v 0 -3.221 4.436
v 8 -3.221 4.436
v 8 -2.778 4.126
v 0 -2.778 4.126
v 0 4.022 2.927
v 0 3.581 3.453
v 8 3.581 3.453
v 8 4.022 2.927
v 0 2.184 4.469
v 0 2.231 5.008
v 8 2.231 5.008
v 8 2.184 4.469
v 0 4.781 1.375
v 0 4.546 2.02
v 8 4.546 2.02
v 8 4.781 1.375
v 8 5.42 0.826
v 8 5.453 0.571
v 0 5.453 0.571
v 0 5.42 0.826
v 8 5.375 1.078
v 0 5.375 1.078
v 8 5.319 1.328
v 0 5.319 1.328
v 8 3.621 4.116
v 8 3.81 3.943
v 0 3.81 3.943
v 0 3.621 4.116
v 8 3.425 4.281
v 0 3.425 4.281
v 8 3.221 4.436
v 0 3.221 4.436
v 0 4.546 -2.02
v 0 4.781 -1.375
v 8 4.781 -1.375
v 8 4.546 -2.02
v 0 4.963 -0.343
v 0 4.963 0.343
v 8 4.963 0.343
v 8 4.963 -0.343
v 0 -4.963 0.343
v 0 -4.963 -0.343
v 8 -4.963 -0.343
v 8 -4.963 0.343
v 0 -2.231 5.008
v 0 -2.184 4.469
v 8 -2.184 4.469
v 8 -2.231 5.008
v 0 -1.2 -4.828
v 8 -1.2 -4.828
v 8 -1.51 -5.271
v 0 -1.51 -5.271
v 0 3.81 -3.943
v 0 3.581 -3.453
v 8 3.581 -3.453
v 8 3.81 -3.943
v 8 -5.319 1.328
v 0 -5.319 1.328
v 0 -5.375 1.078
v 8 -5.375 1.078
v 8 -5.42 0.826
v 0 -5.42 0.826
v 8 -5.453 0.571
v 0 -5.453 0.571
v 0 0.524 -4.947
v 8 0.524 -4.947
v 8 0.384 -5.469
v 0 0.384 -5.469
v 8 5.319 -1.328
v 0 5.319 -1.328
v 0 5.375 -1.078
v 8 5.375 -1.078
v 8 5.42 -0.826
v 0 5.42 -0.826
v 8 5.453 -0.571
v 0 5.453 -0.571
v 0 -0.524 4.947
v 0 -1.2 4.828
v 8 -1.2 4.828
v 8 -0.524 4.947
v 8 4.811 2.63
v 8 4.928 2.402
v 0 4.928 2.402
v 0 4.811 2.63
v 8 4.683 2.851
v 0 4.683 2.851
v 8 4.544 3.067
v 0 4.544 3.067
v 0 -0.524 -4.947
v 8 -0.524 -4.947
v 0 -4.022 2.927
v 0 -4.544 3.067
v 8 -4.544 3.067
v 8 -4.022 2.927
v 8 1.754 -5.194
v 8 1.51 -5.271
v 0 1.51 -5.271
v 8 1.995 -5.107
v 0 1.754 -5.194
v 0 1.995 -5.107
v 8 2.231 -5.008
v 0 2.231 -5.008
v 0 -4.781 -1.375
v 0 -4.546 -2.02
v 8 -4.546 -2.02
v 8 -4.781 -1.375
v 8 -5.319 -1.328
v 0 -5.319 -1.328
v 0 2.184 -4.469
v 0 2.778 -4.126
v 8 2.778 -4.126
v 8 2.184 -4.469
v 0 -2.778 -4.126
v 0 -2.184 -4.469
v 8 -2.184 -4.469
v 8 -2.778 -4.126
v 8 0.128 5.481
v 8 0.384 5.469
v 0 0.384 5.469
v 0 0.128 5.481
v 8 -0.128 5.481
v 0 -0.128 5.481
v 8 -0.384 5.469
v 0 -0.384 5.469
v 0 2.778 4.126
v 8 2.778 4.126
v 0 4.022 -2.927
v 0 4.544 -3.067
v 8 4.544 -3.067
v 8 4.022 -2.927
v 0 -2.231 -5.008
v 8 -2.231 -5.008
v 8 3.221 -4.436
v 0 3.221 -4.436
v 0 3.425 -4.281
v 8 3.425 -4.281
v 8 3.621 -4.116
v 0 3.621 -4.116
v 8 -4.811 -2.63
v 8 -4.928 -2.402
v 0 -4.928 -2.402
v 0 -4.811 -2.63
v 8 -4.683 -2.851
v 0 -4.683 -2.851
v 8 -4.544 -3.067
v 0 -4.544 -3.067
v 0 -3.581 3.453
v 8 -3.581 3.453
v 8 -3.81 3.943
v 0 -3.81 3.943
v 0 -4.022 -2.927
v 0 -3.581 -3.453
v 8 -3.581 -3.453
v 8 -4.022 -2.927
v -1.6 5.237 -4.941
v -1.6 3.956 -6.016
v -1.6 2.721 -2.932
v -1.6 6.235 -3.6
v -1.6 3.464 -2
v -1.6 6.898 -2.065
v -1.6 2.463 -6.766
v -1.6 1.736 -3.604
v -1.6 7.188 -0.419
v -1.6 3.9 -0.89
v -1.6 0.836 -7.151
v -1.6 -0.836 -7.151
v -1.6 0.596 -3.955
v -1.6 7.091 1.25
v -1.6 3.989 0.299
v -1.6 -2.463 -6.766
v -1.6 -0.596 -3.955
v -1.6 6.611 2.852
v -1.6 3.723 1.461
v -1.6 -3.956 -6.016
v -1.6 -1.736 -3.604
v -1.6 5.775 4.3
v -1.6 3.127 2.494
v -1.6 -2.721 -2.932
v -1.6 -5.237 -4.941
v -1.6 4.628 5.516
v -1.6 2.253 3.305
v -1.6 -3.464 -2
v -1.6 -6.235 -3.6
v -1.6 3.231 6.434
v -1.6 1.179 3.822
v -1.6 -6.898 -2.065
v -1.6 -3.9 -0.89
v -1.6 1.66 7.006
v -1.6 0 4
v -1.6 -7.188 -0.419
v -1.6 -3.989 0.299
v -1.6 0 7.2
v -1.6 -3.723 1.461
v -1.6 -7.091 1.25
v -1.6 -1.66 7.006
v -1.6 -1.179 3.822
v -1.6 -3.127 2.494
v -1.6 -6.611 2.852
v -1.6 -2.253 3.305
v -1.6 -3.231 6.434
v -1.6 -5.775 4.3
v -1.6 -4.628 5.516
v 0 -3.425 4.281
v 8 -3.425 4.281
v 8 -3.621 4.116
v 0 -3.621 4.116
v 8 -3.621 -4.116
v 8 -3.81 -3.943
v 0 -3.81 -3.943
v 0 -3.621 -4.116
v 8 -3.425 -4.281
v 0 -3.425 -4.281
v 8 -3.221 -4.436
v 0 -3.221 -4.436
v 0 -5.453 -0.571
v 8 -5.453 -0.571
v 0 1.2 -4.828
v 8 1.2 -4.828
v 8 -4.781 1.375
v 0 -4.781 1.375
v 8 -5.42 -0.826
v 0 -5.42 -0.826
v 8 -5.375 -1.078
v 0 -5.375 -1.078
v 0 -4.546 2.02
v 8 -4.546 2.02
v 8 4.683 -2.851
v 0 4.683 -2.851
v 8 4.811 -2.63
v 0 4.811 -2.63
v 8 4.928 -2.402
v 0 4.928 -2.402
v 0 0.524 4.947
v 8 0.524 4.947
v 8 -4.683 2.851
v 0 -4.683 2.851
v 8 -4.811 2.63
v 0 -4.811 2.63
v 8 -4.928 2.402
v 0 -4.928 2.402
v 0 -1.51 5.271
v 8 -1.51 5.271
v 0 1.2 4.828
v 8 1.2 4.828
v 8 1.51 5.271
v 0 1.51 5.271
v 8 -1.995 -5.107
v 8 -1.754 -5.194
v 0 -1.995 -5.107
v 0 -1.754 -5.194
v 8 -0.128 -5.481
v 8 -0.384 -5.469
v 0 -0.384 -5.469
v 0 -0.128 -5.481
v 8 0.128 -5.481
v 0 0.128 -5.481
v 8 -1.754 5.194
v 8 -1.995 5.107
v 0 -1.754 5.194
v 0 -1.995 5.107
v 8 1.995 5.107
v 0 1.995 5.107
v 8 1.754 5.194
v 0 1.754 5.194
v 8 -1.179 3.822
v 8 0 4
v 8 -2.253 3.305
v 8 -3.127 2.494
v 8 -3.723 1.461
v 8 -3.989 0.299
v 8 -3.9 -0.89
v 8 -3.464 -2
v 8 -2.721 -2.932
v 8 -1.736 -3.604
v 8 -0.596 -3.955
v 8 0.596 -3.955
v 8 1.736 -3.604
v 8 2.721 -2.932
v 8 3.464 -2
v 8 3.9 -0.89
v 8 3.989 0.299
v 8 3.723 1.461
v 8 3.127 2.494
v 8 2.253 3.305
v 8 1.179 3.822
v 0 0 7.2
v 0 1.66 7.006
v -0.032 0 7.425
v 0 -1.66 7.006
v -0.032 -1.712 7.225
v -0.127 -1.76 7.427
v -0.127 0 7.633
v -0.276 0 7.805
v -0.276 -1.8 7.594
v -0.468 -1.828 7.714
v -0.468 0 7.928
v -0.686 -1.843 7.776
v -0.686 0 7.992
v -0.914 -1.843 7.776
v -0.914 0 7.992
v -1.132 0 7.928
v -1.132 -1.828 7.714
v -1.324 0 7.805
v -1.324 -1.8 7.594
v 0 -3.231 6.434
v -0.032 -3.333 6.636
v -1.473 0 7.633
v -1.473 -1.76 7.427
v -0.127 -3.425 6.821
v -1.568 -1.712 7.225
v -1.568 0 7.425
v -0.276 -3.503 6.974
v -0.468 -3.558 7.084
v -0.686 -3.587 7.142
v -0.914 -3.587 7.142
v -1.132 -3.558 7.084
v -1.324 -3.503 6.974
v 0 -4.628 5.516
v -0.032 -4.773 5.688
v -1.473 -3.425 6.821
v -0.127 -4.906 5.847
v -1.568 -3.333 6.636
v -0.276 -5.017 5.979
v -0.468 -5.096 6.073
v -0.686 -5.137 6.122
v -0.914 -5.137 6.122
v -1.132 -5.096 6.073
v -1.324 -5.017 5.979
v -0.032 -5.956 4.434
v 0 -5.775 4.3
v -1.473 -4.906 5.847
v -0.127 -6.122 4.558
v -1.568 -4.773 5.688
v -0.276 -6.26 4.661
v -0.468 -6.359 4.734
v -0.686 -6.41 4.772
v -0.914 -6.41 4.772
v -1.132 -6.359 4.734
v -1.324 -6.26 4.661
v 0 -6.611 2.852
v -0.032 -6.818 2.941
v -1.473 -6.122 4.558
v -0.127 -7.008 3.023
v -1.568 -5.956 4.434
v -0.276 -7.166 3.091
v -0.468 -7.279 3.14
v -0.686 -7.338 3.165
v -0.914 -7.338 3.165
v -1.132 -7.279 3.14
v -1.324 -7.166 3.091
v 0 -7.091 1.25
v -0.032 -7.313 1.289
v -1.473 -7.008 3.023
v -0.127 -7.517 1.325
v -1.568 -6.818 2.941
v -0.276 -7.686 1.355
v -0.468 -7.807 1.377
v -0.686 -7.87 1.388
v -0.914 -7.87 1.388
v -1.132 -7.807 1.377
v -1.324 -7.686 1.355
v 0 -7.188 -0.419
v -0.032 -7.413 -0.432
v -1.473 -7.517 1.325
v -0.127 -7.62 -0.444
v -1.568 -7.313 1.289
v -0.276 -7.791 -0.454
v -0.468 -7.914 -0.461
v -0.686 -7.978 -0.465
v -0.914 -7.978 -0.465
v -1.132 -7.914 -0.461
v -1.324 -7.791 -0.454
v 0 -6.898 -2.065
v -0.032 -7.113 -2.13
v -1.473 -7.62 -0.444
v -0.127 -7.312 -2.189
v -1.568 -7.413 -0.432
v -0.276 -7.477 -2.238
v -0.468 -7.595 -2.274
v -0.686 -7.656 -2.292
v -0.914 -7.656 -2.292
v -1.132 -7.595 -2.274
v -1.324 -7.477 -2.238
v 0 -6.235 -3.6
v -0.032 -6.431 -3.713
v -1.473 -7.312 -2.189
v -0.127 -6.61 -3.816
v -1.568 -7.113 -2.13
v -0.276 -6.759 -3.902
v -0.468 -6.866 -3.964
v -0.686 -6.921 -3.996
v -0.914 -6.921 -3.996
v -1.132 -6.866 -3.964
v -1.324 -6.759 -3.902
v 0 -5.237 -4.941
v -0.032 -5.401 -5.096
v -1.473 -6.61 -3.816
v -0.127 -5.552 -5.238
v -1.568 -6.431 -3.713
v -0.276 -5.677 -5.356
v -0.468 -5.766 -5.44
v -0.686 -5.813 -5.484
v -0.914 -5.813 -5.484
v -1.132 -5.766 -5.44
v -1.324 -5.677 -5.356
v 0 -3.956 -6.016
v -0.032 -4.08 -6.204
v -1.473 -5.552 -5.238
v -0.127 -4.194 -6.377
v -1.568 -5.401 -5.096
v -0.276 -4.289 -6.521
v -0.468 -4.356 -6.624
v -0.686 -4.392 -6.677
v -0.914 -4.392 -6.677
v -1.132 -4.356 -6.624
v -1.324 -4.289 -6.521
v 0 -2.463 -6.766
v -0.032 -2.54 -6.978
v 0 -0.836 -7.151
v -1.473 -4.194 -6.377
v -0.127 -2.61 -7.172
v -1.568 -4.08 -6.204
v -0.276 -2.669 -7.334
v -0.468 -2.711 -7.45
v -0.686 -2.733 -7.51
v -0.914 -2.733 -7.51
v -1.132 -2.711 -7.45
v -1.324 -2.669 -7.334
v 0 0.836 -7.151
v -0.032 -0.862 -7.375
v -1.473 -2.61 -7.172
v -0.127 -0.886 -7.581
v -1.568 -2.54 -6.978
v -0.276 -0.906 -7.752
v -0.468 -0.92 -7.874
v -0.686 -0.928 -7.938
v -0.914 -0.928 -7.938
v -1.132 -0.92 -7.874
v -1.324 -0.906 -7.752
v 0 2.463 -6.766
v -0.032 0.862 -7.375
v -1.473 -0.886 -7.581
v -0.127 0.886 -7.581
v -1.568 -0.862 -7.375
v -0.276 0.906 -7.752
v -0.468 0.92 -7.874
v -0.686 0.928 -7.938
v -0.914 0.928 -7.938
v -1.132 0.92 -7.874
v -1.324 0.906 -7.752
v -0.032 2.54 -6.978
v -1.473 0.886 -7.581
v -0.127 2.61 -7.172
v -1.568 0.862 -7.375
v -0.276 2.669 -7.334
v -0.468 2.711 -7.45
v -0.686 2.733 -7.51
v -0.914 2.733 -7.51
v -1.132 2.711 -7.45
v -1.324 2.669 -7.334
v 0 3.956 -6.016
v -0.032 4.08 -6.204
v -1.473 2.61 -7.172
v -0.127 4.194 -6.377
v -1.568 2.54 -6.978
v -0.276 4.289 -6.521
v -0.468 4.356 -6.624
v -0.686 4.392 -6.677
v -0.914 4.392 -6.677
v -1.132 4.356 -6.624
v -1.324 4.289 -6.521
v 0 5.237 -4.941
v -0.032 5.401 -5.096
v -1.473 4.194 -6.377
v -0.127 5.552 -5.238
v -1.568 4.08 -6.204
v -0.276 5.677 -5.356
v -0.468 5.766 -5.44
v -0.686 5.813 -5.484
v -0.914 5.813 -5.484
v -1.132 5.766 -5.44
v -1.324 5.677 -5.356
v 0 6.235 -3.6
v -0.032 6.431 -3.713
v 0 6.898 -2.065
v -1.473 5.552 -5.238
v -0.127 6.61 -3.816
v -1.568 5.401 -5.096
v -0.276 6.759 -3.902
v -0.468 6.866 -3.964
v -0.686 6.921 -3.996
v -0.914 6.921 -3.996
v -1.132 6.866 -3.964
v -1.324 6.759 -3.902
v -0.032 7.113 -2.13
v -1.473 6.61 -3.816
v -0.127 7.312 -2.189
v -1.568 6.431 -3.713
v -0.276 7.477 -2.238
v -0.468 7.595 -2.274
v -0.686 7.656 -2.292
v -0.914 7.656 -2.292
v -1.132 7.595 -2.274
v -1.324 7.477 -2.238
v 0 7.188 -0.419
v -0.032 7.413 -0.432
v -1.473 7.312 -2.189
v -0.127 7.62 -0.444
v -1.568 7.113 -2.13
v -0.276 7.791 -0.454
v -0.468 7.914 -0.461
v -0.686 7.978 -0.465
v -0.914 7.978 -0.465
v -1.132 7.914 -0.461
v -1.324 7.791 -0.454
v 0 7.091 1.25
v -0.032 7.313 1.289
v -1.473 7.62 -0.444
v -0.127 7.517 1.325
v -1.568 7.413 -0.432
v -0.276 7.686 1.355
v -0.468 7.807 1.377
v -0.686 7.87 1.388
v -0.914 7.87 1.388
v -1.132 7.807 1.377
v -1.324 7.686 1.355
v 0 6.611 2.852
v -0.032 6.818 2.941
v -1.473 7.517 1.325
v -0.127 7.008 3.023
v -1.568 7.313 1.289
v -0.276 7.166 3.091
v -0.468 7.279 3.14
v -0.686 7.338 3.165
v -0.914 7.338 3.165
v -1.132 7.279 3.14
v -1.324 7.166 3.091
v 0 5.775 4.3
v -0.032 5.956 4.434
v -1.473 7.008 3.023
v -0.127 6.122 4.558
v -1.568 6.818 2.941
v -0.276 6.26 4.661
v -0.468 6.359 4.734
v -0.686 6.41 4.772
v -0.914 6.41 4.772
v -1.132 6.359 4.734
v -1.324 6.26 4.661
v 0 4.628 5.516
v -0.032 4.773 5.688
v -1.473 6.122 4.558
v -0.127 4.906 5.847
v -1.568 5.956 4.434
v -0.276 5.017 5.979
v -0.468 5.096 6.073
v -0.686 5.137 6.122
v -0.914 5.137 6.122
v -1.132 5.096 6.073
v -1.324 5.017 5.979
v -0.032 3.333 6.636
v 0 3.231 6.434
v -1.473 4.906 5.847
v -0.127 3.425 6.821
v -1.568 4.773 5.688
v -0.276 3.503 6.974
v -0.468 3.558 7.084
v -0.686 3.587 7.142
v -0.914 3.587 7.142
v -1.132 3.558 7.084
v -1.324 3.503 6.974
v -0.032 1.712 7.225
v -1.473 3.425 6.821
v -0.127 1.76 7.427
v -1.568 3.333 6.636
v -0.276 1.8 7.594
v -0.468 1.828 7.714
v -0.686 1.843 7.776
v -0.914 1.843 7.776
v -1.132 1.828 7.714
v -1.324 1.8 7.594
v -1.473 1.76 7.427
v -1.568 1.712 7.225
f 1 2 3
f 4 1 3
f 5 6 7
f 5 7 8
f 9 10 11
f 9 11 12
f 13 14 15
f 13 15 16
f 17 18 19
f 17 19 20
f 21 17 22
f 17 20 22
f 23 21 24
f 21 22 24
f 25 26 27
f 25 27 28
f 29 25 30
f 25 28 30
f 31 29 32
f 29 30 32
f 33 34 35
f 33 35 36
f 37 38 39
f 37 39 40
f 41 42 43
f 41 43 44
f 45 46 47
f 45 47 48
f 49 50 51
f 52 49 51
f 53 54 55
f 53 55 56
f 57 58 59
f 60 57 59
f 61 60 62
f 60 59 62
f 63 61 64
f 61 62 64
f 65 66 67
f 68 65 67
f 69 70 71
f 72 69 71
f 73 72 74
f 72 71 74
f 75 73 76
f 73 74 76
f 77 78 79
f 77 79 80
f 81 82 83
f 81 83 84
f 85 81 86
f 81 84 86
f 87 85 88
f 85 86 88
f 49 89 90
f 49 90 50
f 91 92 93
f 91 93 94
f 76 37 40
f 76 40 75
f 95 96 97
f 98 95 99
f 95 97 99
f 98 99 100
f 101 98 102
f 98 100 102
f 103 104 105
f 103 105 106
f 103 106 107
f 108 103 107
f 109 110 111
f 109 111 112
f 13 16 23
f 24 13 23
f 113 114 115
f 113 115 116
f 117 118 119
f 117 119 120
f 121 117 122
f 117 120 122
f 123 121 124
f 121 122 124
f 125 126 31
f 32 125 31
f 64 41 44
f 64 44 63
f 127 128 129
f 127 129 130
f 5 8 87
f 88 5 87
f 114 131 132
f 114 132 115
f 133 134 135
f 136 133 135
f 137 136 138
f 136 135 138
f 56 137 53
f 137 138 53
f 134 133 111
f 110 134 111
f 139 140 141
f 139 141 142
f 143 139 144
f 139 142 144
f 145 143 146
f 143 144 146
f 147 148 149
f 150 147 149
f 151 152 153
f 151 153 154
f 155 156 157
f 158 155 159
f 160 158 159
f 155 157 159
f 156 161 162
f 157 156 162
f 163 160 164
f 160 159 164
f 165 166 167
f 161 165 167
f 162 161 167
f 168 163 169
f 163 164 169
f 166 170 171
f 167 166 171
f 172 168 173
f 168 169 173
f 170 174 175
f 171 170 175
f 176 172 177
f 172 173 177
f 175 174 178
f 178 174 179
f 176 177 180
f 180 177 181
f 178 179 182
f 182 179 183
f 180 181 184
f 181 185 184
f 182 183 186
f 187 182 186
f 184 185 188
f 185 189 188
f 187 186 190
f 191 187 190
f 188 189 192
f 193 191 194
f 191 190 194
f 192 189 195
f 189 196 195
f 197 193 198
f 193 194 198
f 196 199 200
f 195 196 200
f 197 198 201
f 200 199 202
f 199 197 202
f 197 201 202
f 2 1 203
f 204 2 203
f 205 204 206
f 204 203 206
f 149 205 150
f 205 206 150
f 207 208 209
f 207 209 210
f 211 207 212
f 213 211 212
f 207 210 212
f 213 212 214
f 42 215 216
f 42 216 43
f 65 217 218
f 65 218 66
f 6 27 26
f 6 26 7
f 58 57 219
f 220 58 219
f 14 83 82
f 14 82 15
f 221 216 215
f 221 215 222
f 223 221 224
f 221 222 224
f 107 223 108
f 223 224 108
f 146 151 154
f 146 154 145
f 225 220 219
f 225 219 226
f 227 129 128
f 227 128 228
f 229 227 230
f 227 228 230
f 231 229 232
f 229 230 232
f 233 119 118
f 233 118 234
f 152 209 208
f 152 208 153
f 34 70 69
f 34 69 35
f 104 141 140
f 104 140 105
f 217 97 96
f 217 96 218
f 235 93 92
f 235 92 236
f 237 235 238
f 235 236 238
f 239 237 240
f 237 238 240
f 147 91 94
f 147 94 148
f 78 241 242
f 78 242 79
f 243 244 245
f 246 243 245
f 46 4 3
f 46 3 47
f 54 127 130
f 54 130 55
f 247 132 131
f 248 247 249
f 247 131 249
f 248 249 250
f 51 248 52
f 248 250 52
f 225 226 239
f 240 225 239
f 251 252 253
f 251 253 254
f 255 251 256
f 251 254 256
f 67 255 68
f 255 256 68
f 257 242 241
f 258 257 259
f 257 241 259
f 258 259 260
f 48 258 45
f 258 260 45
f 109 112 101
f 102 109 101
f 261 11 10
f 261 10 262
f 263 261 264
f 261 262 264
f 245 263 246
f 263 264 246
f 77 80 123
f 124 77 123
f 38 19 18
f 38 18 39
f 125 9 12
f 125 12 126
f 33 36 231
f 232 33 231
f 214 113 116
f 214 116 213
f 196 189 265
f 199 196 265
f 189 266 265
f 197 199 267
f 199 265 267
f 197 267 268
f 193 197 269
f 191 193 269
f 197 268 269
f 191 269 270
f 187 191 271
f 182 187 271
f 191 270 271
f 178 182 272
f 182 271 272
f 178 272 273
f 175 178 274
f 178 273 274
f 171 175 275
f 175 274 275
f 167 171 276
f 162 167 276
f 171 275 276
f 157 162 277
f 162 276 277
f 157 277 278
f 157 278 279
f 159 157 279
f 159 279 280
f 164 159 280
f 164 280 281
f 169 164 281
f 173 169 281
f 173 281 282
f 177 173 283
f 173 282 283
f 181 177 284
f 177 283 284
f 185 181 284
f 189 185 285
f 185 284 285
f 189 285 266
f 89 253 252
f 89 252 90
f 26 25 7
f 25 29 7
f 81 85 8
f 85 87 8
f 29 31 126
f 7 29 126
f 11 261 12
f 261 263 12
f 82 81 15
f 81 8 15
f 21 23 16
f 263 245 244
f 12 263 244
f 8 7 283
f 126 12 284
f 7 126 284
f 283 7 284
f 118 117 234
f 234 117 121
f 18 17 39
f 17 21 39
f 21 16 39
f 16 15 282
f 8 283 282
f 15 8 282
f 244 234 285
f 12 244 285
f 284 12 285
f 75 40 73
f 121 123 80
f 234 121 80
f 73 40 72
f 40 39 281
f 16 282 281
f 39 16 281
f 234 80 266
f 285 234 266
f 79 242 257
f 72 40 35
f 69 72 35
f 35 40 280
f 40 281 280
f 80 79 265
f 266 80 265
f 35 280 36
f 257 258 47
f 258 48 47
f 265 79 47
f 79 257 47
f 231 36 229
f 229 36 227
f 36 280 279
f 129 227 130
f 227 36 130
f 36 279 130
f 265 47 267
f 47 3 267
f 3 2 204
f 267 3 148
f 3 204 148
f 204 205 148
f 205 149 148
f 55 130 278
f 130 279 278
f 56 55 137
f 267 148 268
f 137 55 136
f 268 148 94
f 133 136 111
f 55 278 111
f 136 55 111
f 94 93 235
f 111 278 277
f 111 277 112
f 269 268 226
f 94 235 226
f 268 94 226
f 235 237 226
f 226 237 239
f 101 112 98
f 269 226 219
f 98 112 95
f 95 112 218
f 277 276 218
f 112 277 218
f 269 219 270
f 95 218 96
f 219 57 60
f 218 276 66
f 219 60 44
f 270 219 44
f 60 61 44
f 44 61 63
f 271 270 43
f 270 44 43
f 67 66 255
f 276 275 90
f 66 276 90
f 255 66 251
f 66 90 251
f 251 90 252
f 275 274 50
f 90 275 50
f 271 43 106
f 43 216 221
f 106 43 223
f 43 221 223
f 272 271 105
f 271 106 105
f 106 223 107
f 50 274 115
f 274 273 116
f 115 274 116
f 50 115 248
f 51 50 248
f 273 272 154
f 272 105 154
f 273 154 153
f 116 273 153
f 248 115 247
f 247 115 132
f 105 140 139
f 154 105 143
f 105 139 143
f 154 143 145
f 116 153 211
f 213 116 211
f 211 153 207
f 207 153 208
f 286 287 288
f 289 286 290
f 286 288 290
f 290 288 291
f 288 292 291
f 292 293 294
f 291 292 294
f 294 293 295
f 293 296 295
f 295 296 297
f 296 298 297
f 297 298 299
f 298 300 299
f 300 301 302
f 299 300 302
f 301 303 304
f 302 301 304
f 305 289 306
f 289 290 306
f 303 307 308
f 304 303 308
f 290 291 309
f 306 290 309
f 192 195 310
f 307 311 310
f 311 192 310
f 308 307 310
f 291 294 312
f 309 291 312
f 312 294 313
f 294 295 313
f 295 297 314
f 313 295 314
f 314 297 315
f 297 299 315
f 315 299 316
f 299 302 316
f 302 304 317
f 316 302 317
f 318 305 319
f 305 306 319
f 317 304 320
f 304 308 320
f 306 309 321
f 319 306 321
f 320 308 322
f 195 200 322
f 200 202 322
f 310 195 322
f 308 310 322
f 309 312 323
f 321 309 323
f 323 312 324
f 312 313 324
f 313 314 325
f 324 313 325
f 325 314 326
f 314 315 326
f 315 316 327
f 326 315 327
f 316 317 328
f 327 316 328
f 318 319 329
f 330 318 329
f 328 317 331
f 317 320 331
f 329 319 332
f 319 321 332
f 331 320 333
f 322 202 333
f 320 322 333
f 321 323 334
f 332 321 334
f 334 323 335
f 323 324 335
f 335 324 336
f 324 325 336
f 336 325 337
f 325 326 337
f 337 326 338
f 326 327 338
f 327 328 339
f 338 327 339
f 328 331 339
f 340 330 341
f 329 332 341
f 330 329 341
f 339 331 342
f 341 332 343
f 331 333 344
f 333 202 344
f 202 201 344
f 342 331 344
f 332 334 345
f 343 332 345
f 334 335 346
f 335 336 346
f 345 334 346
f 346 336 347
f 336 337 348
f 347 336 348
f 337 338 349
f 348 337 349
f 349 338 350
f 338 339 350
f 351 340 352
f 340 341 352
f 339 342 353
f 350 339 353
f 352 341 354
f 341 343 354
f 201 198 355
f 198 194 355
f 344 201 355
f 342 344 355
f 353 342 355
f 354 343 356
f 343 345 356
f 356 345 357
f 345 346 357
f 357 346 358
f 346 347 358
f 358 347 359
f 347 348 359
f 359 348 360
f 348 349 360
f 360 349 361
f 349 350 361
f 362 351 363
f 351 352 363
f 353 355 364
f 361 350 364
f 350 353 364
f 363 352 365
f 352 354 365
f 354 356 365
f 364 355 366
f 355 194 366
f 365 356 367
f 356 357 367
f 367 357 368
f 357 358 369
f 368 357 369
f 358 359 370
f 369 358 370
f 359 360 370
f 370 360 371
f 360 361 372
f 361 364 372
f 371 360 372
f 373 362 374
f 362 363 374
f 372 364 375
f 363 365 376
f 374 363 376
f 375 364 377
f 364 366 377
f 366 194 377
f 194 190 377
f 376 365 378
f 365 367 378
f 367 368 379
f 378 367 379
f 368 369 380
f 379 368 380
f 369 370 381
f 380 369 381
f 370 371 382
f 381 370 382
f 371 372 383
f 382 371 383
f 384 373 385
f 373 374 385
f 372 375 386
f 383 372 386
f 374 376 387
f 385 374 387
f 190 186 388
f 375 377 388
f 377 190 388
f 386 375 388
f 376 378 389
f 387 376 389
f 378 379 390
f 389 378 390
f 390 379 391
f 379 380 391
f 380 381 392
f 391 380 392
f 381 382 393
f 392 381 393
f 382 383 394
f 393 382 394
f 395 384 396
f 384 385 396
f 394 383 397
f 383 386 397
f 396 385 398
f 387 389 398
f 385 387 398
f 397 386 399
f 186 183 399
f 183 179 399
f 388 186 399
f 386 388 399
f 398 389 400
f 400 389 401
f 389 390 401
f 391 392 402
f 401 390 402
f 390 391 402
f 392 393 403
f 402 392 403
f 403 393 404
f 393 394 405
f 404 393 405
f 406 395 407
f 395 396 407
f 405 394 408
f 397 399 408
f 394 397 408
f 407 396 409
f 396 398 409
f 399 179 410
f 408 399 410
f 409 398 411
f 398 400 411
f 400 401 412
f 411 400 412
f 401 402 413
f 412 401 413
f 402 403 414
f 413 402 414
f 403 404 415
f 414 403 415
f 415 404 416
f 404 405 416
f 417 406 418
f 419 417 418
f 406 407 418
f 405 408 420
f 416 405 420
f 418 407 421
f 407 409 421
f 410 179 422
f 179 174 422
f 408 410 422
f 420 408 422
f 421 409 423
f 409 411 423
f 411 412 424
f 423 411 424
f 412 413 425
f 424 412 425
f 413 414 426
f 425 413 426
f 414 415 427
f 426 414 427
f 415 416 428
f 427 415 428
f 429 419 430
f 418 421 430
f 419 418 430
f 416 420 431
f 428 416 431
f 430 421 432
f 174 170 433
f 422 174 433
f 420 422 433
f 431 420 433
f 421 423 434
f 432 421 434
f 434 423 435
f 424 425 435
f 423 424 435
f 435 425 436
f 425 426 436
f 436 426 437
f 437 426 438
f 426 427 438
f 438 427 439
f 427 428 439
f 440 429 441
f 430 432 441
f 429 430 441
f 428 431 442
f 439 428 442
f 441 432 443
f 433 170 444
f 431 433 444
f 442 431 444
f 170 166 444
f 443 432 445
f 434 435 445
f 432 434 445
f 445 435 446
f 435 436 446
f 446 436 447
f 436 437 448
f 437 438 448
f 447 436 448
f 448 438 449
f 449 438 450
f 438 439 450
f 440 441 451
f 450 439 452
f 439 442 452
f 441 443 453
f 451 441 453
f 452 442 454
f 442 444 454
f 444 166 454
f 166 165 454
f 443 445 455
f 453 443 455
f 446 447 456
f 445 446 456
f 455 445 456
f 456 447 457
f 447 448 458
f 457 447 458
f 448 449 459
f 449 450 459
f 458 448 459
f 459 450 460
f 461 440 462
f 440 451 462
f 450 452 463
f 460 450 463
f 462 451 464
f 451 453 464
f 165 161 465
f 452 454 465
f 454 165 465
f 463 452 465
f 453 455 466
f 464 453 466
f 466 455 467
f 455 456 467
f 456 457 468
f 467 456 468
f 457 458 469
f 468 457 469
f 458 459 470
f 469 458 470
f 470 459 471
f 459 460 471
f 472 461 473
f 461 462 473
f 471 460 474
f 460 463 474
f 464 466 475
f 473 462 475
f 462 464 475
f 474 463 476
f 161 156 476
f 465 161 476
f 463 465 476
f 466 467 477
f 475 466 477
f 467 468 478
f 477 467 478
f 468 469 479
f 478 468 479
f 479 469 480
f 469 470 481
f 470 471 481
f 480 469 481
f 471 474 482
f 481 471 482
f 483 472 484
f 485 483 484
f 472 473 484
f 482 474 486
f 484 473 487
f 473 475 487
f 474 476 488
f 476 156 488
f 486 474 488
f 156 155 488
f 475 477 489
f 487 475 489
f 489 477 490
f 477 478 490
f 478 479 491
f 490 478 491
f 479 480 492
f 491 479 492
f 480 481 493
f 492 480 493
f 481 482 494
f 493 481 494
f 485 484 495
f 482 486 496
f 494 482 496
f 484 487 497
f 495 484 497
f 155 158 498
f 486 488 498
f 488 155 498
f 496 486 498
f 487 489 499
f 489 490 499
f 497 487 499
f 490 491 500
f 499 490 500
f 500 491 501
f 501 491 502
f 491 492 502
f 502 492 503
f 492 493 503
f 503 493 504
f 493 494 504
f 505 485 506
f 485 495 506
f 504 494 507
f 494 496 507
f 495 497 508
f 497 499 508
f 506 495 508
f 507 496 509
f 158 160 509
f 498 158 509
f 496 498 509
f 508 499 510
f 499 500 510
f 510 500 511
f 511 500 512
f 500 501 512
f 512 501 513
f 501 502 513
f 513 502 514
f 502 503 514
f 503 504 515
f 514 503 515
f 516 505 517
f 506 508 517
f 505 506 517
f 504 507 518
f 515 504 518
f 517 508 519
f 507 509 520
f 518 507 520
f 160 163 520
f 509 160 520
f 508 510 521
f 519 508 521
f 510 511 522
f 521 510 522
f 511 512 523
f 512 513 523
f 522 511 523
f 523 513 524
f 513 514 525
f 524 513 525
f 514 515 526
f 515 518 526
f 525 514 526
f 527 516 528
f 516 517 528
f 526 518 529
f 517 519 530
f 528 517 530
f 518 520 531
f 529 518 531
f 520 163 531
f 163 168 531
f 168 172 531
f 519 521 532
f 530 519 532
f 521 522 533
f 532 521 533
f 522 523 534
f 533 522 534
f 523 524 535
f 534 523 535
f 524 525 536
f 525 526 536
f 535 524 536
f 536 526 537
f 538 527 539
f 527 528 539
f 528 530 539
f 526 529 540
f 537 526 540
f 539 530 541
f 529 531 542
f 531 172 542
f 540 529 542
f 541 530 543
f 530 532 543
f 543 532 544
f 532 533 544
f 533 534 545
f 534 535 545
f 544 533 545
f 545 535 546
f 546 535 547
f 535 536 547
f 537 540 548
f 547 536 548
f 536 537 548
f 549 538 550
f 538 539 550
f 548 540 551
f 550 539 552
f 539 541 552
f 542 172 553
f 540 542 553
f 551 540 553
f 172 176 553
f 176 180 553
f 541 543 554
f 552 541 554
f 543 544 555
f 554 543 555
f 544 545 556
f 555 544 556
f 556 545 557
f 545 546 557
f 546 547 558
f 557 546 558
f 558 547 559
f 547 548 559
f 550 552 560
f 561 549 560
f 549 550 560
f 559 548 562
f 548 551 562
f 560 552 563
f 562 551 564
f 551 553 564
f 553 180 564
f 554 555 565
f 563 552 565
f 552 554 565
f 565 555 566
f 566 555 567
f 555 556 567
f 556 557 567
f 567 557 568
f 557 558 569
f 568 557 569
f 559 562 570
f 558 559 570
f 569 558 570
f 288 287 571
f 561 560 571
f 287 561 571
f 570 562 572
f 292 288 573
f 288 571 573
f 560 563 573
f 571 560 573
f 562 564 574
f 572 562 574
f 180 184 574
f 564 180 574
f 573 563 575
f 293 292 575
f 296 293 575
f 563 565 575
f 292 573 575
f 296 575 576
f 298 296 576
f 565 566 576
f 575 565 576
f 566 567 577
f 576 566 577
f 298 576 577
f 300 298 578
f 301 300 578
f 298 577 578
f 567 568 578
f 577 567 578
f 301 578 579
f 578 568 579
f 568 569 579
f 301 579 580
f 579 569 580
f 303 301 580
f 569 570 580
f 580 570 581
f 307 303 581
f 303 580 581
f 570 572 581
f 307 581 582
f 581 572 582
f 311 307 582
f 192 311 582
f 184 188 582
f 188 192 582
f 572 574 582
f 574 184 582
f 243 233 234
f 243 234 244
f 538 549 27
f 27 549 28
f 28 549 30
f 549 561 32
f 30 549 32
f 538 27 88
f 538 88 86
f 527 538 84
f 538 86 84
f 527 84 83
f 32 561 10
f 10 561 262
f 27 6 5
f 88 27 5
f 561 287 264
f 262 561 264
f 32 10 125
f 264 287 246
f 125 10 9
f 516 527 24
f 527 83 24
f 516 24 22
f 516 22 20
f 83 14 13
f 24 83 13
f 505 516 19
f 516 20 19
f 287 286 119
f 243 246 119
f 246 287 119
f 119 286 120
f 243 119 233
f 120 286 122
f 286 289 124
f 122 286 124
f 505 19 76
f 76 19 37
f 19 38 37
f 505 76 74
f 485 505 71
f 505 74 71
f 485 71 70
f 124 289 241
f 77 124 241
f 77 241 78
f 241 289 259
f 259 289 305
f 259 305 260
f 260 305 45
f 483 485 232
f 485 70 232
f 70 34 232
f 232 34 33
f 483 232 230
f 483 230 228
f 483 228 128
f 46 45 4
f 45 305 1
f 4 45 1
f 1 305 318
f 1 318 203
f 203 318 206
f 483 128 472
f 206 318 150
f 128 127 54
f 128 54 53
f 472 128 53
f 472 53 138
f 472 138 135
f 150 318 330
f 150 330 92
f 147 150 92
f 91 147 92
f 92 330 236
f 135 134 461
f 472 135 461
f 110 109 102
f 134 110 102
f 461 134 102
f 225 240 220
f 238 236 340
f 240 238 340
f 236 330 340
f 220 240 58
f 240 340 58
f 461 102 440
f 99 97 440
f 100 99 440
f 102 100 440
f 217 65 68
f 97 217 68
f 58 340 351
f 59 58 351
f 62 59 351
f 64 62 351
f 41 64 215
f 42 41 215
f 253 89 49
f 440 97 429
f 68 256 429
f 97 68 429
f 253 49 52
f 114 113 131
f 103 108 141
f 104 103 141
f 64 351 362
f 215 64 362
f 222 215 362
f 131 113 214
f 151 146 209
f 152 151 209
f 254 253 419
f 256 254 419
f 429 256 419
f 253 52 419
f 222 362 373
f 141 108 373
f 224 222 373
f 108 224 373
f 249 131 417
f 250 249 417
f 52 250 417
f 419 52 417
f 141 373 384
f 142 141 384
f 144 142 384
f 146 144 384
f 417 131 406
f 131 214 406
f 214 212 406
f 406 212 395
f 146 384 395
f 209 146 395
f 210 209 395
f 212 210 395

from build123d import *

# Parameters (mm, degrees)
SKETCH4_R          = 5.8
SKETCH4_R_2        = 5.4825
CUT_EXTRUDE2_DEPTH = 8
CUT_EXTRUDE1_DEPTH = 8
CIRPATTERN1_COUNT  = 18


with BuildPart() as part:
    # Sketch1 → Revolve1 (revolve)
    with BuildSketch(Plane.XY, mode=Mode.PRIVATE) as revolve1_sk:
        with BuildLine():
            Line((-1.6, 4), (8, 4))
            Line((8, 4), (8, 5.55))
            Line((8, 5.55), (0, 5.55))
            Line((0, 5.55), (0, 7.2))
            ThreePointArc((0, 7.2), (-0.8, 8), (-1.6, 7.2))
            Line((-1.6, 7.2), (-1.6, 4))
        make_face()
    revolve(revolve1_sk.sketch.rotate(Axis((-1.6, 0, 0), (1, 0, 0)), 90), axis=Axis((-1.6, 0, 0), (1, 0, 0)))

    # Sketch4 → Cut-Extrude2 (cut)
    with BuildSketch(Plane(origin=(0, 0, 0), x_dir=(0, 0, -1), z_dir=(1, 0, 0))):
        Circle(SKETCH4_R)
        with Locations(Location((0, 0, 0), (0, 0, 180))):
            Circle(SKETCH4_R_2, mode=Mode.SUBTRACT)
    extrude(amount=CUT_EXTRUDE2_DEPTH, mode=Mode.SUBTRACT)

    # Sketch3 → Cut-Extrude1 (cut)
    with BuildSketch(Plane(origin=(0, 0, 0), x_dir=(0, 0, -1), z_dir=(1, 0, 0))):
        with BuildLine():
            Line((-0.642345316, 5.604560113), (-0.343021997, 4.962659182))
            Line((-0.343021997, 4.962659182), (0.343021997, 4.962659182))
            Line((0.343021997, 4.962659182), (0.642345316, 5.604560113))
            ThreePointArc((0.642345316, 5.604560113), (0, 5.64125), (-0.642345316, 5.604560113))
        make_face()
    cut_extrude1 = extrude(amount=CUT_EXTRUDE1_DEPTH, mode=Mode.SUBTRACT)

    # CirPattern1: Cut-Extrude1 ×18 about axis
    cirpattern1_axis = Axis((0, 0, 0), (1, 0, 0))
    for i in range(1, CIRPATTERN1_COUNT):
        add(cut_extrude1.rotate(cirpattern1_axis, i * 360 / CIRPATTERN1_COUNT), mode=Mode.SUBTRACT)


solid = part.part
